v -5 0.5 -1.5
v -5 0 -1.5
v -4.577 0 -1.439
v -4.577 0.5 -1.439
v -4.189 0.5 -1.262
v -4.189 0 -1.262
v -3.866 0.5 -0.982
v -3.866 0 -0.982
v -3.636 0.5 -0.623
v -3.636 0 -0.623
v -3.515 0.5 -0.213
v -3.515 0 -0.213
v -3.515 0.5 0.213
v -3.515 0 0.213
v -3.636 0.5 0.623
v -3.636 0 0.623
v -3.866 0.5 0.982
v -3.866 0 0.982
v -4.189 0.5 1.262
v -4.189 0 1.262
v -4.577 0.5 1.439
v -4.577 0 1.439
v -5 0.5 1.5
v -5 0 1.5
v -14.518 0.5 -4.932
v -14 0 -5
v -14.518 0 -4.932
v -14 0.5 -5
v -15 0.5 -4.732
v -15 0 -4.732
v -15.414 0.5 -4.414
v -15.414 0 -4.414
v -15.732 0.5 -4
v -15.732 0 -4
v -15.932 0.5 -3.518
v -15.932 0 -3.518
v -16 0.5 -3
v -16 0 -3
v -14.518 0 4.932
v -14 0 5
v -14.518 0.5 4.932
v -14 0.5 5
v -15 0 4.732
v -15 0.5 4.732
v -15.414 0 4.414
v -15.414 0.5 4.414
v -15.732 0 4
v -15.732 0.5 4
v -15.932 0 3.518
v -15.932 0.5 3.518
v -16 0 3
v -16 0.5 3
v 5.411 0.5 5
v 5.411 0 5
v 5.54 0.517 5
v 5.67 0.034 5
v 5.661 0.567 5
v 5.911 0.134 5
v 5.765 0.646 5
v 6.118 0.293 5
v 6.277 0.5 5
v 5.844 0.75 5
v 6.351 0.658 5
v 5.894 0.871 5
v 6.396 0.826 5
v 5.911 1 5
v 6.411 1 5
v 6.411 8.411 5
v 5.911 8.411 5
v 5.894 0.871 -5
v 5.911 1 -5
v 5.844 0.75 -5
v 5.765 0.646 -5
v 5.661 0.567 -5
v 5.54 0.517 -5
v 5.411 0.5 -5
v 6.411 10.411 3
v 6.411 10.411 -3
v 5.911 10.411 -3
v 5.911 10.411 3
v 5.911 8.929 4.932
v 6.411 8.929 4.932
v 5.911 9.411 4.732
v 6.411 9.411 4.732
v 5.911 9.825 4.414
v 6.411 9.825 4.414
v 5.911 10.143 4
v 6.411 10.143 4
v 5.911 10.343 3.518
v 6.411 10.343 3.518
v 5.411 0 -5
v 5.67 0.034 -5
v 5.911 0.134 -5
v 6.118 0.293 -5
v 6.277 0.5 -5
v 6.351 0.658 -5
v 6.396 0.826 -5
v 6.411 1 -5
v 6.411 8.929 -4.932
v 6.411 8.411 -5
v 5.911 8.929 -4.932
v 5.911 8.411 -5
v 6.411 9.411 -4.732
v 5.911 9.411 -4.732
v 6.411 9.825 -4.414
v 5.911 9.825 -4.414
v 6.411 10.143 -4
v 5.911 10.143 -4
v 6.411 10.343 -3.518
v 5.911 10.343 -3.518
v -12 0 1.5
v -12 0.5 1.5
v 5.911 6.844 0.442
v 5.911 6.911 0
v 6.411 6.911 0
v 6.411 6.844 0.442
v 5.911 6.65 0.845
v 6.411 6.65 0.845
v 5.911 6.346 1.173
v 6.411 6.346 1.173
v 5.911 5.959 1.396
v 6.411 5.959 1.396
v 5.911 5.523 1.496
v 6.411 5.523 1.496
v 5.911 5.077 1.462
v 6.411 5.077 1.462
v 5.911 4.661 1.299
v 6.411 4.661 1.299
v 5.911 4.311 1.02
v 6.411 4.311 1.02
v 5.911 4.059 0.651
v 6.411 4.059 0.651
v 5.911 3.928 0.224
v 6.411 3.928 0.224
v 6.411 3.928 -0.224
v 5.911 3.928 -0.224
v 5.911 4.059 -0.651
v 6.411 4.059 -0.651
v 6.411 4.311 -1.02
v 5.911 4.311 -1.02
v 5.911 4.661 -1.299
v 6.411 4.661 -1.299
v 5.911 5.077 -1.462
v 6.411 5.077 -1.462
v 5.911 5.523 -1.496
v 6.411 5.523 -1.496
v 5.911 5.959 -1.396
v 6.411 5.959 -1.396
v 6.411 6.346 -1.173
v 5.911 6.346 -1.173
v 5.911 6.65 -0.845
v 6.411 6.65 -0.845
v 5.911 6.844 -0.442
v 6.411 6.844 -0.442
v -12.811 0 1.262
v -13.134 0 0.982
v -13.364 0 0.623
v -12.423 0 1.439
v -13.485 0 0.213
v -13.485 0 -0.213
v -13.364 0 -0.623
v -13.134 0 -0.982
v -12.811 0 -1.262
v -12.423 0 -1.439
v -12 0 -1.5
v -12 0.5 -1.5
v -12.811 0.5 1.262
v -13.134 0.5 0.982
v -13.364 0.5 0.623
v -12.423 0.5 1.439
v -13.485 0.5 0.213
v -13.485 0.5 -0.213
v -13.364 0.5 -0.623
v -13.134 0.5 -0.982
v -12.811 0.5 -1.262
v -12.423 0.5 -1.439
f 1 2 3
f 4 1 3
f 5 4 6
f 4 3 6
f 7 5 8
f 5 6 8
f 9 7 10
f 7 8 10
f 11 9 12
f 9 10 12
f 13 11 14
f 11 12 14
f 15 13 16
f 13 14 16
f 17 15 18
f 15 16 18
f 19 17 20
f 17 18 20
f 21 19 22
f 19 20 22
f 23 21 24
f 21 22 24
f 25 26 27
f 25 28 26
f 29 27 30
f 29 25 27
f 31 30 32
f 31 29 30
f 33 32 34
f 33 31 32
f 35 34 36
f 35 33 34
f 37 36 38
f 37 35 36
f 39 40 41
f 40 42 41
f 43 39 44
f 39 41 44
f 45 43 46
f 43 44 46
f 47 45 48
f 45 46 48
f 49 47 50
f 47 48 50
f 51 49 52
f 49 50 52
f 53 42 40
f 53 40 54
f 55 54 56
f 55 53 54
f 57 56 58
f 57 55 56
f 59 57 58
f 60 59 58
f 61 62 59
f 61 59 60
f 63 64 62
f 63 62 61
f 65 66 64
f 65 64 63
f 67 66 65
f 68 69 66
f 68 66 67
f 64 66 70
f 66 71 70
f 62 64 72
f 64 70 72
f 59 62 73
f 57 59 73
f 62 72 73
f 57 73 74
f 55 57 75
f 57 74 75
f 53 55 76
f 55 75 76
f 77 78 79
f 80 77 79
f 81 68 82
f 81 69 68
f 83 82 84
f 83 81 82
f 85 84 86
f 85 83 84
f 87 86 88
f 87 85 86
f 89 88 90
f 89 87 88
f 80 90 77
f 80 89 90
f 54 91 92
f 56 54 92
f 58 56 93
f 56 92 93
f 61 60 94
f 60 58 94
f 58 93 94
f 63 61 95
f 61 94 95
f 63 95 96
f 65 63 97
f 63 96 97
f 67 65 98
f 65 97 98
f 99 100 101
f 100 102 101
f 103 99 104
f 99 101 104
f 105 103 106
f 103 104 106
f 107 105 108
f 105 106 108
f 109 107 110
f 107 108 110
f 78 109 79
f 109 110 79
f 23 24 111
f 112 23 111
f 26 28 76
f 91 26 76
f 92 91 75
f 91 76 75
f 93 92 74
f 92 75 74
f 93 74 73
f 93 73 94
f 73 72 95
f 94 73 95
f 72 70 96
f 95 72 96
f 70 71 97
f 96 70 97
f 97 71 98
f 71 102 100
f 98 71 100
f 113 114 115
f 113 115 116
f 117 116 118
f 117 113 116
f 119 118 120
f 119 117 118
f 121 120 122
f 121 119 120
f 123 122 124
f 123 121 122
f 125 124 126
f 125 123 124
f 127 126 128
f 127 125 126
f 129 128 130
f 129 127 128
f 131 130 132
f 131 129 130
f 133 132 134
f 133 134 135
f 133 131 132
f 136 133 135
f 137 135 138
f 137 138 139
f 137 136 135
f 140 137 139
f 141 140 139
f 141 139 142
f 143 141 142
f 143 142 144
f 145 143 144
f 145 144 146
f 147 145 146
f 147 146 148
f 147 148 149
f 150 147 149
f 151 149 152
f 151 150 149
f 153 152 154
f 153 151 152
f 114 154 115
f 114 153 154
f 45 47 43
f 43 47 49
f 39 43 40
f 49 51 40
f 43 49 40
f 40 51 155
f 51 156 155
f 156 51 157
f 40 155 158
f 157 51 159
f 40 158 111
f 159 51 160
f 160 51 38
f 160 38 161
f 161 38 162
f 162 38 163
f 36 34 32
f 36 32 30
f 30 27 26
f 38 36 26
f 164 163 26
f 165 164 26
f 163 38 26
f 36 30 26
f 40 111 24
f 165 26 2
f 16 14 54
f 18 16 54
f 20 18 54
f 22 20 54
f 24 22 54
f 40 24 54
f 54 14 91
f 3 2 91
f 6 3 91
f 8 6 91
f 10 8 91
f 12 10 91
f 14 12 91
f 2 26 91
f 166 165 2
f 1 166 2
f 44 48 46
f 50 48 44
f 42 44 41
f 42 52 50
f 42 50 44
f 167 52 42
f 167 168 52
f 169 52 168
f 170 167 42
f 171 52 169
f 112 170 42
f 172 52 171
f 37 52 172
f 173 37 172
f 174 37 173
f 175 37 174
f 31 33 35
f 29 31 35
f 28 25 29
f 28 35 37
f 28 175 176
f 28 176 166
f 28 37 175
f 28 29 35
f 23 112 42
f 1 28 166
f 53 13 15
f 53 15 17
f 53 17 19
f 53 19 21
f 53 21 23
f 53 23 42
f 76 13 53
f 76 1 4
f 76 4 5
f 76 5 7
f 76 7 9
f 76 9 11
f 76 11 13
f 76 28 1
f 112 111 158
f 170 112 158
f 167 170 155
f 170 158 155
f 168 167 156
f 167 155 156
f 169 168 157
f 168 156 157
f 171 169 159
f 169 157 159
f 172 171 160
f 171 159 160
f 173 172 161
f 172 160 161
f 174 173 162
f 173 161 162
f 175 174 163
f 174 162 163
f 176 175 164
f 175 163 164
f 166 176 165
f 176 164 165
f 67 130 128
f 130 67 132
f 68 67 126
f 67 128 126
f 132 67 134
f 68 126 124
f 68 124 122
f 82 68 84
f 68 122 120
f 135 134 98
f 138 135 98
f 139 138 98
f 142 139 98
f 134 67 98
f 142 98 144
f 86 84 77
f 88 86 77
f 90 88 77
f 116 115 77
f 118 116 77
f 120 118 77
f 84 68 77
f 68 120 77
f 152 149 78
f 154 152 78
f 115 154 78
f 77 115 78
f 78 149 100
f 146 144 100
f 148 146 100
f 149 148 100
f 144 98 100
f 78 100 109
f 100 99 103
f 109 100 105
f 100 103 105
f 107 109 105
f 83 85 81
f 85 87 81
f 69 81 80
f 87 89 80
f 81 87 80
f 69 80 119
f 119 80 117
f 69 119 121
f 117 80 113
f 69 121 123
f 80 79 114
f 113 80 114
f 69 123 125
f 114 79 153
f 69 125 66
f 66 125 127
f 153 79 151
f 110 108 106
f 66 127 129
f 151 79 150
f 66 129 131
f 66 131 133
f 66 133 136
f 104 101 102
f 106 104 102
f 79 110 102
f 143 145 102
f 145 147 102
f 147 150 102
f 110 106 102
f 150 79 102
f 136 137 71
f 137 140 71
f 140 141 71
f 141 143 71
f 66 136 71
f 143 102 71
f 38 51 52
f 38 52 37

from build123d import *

# Parameters (mm, degrees)
SKETCH_1_W          = 32
SKETCH_1_H          = 10
SKETCH_1_R          = 1.5
EXTRUDE_1_DEPTH     = 0.5
OTHER_START         = -5
OTHER_1_DEPTH       = 10
OTHER_1_2_DEPTH     = 3.4999999
OTHER_START_2       = 1.5000001
OTHER_1_3_DEPTH     = 3.4999999
OTHER_START_3       = -1.5000001
OTHER_1_4_DEPTH     = 3.0000001
OTHER_START_4       = 5.910951377
OTHER_1_5_OUTLINE_R = 1.5
OTHER_1_5_DEPTH     = 0.5
FILLET_1_R          = 2


with BuildPart() as part:
    # Sketch 1 → Бобышка-Вытянуть1 (new body)
    with BuildSketch(Plane(origin=(0, 0, 0), x_dir=(1, 0, 0), z_dir=(0, 1, 0))):
        Rectangle(SKETCH_1_W, SKETCH_1_H)
        with Locations(Location((11, 0, 0), (0, 0, 270))):
            Circle(SKETCH_1_R, mode=Mode.SUBTRACT)
        with BuildLine():
            Line((-12, 1.5), (-5, 1.5))
            ThreePointArc((-5, 1.5), (-3.5, 0), (-5, -1.5))
            Line((-5, -1.5), (-12, -1.5))
            ThreePointArc((-12, -1.5), (-13.5, 0), (-12, 1.5))
        make_face(mode=Mode.SUBTRACT)
    extrude(amount=EXTRUDE_1_DEPTH)

    # Other 1: read off the stored shape, not the designer's step
    # Other 1 outline → Other 1 (cut)
    with BuildSketch(Plane.XY.offset(OTHER_START)):
        with BuildLine():
            Line((16, 0.5), (6.276976781, 0.5))
            ThreePointArc((6.276976781, 0.5), (5.910951377, 0.133974596), (5.410951377, 0))
            Line((5.410951377, 0), (16, 0))
            Line((16, 0), (16, 0.5))
        make_face()
    extrude(amount=OTHER_1_DEPTH, mode=Mode.SUBTRACT)

    # Other 1 2 outline → Other 1 2 (add)
    with BuildSketch(Plane.XY.offset(OTHER_START)):
        with BuildLine():
            Line((6.410951377, 1), (6.410951377, 10.410951377))
            Line((6.410951377, 10.410951377), (5.910951377, 10.410951377))
            Line((5.910951377, 10.410951377), (5.910951377, 1))
            ThreePointArc((5.910951377, 1), (5.764504768, 0.646446609), (5.410951377, 0.5))
            Line((5.410951377, 0.5), (6.276976781, 0.5))
            ThreePointArc((6.276976781, 0.5), (6.376877204, 0.741180955), (6.410951377, 1))
        make_face()
    extrude(amount=OTHER_1_2_DEPTH)

    # Other 1 3 outline → Other 1 3 (add)
    with BuildSketch(Plane.XY.offset(OTHER_START_2)):
        with BuildLine():
            Line((6.410951377, 1), (6.410951377, 10.410951377))
            Line((6.410951377, 10.410951377), (5.910951377, 10.410951377))
            Line((5.910951377, 10.410951377), (5.910951377, 1))
            ThreePointArc((5.910951377, 1), (5.764504768, 0.646446609), (5.410951377, 0.5))
            Line((5.410951377, 0.5), (6.276976781, 0.5))
            ThreePointArc((6.276976781, 0.5), (6.376877204, 0.741180955), (6.410951377, 1))
        make_face()
    extrude(amount=OTHER_1_3_DEPTH)

    # Other 1 4 outline → Other 1 4 (add)
    with BuildSketch(Plane.XY.offset(OTHER_START_3)):
        with BuildLine():
            Line((6.410951377, 1), (6.410951377, 10.410951377))
            Line((6.410951377, 10.410951377), (5.910951377, 10.410951377))
            Line((5.910951377, 10.410951377), (5.910951377, 1))
            ThreePointArc((5.910951377, 1), (5.764504768, 0.646446609), (5.410951377, 0.5))
            Line((5.410951377, 0.5), (6.276976781, 0.5))
            ThreePointArc((6.276976781, 0.5), (6.376877204, 0.741180955), (6.410951377, 1))
        make_face()
    extrude(amount=OTHER_1_4_DEPTH)

    # Other 1 5 outline → Other 1 5 (cut)
    with BuildSketch(Plane.YZ.offset(OTHER_START_4)):
        with Locations((5.410951377, 0)):
            Circle(OTHER_1_5_OUTLINE_R)
    extrude(amount=OTHER_1_5_DEPTH, mode=Mode.SUBTRACT)

    # Скругление1
    fillet_1_edges = [part.edges().sort_by_distance(p)[0] for p in [
        (6.160951377, 10.410951377, -5),
        (6.160951377, 10.410951377, 5),
        (-16, 0.25, 5),
        (-16, 0.25, -5),
    ]]
    fillet(fillet_1_edges, radius=FILLET_1_R)


solid = part.part
